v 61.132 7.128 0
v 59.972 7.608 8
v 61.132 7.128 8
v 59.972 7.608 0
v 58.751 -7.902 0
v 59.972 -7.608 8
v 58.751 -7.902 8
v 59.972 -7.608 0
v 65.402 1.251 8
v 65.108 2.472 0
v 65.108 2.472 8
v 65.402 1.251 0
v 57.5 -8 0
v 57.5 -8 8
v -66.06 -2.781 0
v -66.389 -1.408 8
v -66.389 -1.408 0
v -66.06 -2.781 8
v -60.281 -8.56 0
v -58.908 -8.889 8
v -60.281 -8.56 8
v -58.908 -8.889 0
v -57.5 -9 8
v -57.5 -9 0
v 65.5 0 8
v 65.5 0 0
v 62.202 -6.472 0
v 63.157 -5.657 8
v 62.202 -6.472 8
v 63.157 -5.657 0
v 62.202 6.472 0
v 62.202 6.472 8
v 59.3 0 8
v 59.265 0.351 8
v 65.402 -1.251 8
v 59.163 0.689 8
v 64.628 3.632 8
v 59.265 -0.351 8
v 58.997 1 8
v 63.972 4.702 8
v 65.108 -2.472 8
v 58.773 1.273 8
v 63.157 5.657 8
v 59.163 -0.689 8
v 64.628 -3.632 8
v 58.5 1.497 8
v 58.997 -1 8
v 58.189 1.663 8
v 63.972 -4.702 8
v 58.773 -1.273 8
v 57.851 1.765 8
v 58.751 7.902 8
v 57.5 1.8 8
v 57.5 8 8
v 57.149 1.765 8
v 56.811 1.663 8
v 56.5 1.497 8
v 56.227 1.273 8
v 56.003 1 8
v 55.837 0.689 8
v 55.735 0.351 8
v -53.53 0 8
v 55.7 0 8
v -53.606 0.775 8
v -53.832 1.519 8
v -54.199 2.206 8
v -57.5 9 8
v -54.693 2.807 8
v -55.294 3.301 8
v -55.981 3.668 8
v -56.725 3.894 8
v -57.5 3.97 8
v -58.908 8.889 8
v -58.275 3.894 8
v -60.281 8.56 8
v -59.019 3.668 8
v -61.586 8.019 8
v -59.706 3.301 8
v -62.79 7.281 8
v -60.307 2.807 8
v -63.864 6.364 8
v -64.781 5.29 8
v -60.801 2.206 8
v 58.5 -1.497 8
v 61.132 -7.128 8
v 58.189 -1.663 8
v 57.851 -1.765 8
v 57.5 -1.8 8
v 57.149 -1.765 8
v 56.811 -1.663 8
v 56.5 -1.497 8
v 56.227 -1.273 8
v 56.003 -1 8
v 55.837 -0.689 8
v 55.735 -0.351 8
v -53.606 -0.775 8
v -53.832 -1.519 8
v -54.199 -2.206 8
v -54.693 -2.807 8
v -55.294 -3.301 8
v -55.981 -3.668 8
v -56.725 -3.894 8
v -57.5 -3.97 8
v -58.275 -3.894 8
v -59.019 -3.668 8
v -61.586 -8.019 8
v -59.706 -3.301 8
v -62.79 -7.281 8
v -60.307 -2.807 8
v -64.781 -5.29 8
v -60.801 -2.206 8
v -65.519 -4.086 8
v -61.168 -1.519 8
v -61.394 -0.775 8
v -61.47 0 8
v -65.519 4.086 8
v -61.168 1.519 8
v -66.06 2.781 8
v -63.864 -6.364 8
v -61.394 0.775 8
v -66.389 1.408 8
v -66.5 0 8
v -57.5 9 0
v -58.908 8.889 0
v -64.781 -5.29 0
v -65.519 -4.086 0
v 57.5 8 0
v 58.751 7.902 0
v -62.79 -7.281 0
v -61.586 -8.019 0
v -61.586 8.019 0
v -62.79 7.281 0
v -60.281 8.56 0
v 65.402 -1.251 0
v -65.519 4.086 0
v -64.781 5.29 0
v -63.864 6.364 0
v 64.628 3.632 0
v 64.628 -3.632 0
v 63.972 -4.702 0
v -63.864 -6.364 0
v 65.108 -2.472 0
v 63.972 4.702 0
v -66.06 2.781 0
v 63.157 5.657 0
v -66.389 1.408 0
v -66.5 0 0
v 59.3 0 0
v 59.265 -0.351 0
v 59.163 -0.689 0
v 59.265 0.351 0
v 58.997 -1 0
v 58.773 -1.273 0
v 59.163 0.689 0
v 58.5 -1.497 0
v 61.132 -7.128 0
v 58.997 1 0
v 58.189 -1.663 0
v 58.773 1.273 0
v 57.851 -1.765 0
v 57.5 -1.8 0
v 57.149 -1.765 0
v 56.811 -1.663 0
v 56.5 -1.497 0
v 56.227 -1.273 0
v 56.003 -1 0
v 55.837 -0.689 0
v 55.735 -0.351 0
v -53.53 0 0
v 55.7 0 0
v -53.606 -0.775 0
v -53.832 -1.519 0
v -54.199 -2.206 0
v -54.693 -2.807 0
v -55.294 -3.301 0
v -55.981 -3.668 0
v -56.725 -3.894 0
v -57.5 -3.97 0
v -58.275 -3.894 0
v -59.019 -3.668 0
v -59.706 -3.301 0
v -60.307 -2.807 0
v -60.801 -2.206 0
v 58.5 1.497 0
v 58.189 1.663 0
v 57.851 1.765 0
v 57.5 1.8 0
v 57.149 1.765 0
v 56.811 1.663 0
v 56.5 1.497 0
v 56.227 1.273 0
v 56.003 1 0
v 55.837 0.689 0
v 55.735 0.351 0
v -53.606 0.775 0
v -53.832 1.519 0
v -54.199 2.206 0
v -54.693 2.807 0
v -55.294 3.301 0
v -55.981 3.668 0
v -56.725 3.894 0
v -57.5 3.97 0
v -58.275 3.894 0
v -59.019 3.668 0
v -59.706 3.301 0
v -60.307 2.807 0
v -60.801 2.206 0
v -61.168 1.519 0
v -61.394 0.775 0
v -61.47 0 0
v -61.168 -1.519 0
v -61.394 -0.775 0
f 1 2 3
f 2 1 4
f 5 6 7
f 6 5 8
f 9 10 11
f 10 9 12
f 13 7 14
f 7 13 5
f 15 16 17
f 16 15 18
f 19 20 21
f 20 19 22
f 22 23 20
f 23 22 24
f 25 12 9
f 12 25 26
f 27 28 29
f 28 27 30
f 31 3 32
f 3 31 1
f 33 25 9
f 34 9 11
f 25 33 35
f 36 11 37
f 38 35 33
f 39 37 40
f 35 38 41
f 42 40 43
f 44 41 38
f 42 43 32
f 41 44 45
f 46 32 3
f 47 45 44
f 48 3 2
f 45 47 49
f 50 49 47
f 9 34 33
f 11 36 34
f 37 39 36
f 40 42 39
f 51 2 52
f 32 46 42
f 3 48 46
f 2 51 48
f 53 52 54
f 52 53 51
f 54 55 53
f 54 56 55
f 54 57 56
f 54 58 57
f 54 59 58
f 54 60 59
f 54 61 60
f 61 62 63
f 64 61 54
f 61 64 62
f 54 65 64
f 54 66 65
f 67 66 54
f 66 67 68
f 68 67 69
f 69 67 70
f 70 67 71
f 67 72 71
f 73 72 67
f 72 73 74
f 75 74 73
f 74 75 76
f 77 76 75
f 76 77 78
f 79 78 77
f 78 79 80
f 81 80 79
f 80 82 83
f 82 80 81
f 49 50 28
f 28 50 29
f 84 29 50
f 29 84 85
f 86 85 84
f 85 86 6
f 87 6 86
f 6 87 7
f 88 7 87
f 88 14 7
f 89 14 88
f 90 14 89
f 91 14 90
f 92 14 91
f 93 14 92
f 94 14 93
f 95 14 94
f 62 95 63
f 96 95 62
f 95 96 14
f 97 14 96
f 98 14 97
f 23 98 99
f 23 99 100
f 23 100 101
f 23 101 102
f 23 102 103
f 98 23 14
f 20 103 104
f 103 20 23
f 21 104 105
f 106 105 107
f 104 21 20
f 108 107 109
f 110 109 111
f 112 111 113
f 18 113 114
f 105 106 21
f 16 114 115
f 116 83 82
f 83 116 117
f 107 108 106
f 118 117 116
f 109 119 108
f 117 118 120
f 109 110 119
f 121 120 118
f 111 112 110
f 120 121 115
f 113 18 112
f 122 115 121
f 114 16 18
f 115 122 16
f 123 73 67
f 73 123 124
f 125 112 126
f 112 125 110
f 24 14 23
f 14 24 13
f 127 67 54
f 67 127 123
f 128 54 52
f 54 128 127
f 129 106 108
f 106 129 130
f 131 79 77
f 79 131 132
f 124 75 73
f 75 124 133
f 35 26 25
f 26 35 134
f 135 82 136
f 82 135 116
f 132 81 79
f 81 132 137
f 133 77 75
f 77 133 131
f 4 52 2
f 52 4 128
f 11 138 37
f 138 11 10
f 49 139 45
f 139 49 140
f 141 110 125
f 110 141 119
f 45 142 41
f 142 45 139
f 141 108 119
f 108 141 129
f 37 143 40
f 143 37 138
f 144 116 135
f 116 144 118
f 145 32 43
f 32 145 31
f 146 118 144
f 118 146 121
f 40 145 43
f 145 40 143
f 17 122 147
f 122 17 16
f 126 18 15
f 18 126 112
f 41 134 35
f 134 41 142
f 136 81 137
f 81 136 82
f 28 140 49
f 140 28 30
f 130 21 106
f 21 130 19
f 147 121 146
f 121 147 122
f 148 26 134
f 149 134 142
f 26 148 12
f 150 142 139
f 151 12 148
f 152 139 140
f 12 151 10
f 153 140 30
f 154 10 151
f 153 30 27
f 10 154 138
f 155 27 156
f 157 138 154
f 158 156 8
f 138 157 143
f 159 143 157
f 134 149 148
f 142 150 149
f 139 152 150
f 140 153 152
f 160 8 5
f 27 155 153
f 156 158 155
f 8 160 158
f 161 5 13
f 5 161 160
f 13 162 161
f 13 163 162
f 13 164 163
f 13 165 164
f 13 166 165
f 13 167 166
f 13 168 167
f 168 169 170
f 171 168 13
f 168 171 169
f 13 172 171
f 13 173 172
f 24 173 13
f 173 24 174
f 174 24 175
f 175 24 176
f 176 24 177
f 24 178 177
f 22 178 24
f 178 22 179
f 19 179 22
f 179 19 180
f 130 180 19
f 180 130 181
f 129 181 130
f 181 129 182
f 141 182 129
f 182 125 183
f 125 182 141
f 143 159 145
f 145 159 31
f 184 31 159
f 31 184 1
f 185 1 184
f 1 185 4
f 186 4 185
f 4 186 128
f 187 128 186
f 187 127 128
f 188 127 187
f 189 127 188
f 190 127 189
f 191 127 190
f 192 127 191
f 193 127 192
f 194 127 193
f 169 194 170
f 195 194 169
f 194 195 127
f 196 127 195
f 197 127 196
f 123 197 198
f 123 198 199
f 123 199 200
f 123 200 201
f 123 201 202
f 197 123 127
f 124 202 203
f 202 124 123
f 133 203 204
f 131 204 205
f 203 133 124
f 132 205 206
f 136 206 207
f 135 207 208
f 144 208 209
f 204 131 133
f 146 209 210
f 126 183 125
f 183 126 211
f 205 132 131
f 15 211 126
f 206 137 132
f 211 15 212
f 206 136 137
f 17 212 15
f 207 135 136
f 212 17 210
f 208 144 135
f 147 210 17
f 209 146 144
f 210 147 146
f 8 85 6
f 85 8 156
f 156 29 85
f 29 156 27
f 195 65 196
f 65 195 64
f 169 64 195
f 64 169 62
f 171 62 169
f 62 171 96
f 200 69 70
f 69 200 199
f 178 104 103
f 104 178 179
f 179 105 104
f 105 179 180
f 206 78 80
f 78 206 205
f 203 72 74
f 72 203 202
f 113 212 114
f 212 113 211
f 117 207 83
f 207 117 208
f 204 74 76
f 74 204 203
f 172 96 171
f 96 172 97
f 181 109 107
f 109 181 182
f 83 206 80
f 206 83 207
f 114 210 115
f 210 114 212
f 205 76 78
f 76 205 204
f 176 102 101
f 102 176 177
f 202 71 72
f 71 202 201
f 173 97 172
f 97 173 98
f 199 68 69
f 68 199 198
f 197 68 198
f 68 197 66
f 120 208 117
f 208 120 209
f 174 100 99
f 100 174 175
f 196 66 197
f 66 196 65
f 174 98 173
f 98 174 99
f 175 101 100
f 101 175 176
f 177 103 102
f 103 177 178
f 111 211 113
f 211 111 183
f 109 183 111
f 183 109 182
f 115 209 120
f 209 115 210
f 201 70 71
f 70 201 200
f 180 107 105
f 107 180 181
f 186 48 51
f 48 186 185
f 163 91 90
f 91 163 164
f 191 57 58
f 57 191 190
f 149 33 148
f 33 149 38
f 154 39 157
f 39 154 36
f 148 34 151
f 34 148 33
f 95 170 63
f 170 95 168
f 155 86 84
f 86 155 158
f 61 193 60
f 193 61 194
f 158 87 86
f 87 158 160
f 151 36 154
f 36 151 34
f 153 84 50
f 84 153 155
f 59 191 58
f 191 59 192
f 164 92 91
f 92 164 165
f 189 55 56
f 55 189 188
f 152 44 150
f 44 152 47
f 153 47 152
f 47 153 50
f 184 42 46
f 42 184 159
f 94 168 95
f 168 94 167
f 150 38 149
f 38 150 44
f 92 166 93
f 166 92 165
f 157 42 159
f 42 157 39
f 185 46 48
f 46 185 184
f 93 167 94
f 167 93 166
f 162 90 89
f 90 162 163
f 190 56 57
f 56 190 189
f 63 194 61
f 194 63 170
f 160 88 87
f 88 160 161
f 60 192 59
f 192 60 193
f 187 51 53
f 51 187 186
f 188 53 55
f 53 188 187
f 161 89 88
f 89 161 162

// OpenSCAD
$fn = 32;

// ----------------------------------------------------------------------
// Lever: 115 mm between the bosses, 8 mm thick, smooth outline
// ----------------------------------------------------------------------

// --- parameters (mm) ---
lever_l = 115;            // distance between the boss centres
boss_a = 18;              // first boss diameter
boss_b = 16;              // second boss diameter
bore_a = 7.94;            // first bore
bore_b = 3.6;             // second bore
lever_t = 8;              // lever thickness

lever_profile = [[-66.5, 0], [-66.389, -1.408], [-66.06, -2.781], [-65.519, -4.086], [-64.781, -5.29], [-63.864, -6.364], [-62.79, -7.281], [-61.586, -8.019], [-60.281, -8.56], [-58.908, -8.889], [-57.5, -9], [57.5, -8], [58.751, -7.902], [59.972, -7.608], [61.132, -7.128], [62.202, -6.472], [63.157, -5.657], [63.972, -4.702], [64.628, -3.632], [65.108, -2.472], [65.402, -1.251], [65.5, 0], [65.402, 1.251], [65.108, 2.472], [64.628, 3.632], [63.972, 4.702], [63.157, 5.657], [62.202, 6.472], [61.132, 7.128], [59.972, 7.608], [58.751, 7.902], [57.5, 8], [-57.5, 9], [-58.908, 8.889], [-60.281, 8.56], [-61.586, 8.019], [-62.79, 7.281], [-63.864, 6.364], [-64.781, 5.29], [-65.519, 4.086], [-66.06, 2.781], [-66.389, 1.408]];

difference() {
  linear_extrude(height = lever_t) polygon(lever_profile);
  translate([-57.5, 0, -2.5]) cylinder(h = lever_t + 5, d = bore_a);
  translate([57.5, 0, -2.5]) cylinder(h = lever_t + 5, d = bore_b);
}
